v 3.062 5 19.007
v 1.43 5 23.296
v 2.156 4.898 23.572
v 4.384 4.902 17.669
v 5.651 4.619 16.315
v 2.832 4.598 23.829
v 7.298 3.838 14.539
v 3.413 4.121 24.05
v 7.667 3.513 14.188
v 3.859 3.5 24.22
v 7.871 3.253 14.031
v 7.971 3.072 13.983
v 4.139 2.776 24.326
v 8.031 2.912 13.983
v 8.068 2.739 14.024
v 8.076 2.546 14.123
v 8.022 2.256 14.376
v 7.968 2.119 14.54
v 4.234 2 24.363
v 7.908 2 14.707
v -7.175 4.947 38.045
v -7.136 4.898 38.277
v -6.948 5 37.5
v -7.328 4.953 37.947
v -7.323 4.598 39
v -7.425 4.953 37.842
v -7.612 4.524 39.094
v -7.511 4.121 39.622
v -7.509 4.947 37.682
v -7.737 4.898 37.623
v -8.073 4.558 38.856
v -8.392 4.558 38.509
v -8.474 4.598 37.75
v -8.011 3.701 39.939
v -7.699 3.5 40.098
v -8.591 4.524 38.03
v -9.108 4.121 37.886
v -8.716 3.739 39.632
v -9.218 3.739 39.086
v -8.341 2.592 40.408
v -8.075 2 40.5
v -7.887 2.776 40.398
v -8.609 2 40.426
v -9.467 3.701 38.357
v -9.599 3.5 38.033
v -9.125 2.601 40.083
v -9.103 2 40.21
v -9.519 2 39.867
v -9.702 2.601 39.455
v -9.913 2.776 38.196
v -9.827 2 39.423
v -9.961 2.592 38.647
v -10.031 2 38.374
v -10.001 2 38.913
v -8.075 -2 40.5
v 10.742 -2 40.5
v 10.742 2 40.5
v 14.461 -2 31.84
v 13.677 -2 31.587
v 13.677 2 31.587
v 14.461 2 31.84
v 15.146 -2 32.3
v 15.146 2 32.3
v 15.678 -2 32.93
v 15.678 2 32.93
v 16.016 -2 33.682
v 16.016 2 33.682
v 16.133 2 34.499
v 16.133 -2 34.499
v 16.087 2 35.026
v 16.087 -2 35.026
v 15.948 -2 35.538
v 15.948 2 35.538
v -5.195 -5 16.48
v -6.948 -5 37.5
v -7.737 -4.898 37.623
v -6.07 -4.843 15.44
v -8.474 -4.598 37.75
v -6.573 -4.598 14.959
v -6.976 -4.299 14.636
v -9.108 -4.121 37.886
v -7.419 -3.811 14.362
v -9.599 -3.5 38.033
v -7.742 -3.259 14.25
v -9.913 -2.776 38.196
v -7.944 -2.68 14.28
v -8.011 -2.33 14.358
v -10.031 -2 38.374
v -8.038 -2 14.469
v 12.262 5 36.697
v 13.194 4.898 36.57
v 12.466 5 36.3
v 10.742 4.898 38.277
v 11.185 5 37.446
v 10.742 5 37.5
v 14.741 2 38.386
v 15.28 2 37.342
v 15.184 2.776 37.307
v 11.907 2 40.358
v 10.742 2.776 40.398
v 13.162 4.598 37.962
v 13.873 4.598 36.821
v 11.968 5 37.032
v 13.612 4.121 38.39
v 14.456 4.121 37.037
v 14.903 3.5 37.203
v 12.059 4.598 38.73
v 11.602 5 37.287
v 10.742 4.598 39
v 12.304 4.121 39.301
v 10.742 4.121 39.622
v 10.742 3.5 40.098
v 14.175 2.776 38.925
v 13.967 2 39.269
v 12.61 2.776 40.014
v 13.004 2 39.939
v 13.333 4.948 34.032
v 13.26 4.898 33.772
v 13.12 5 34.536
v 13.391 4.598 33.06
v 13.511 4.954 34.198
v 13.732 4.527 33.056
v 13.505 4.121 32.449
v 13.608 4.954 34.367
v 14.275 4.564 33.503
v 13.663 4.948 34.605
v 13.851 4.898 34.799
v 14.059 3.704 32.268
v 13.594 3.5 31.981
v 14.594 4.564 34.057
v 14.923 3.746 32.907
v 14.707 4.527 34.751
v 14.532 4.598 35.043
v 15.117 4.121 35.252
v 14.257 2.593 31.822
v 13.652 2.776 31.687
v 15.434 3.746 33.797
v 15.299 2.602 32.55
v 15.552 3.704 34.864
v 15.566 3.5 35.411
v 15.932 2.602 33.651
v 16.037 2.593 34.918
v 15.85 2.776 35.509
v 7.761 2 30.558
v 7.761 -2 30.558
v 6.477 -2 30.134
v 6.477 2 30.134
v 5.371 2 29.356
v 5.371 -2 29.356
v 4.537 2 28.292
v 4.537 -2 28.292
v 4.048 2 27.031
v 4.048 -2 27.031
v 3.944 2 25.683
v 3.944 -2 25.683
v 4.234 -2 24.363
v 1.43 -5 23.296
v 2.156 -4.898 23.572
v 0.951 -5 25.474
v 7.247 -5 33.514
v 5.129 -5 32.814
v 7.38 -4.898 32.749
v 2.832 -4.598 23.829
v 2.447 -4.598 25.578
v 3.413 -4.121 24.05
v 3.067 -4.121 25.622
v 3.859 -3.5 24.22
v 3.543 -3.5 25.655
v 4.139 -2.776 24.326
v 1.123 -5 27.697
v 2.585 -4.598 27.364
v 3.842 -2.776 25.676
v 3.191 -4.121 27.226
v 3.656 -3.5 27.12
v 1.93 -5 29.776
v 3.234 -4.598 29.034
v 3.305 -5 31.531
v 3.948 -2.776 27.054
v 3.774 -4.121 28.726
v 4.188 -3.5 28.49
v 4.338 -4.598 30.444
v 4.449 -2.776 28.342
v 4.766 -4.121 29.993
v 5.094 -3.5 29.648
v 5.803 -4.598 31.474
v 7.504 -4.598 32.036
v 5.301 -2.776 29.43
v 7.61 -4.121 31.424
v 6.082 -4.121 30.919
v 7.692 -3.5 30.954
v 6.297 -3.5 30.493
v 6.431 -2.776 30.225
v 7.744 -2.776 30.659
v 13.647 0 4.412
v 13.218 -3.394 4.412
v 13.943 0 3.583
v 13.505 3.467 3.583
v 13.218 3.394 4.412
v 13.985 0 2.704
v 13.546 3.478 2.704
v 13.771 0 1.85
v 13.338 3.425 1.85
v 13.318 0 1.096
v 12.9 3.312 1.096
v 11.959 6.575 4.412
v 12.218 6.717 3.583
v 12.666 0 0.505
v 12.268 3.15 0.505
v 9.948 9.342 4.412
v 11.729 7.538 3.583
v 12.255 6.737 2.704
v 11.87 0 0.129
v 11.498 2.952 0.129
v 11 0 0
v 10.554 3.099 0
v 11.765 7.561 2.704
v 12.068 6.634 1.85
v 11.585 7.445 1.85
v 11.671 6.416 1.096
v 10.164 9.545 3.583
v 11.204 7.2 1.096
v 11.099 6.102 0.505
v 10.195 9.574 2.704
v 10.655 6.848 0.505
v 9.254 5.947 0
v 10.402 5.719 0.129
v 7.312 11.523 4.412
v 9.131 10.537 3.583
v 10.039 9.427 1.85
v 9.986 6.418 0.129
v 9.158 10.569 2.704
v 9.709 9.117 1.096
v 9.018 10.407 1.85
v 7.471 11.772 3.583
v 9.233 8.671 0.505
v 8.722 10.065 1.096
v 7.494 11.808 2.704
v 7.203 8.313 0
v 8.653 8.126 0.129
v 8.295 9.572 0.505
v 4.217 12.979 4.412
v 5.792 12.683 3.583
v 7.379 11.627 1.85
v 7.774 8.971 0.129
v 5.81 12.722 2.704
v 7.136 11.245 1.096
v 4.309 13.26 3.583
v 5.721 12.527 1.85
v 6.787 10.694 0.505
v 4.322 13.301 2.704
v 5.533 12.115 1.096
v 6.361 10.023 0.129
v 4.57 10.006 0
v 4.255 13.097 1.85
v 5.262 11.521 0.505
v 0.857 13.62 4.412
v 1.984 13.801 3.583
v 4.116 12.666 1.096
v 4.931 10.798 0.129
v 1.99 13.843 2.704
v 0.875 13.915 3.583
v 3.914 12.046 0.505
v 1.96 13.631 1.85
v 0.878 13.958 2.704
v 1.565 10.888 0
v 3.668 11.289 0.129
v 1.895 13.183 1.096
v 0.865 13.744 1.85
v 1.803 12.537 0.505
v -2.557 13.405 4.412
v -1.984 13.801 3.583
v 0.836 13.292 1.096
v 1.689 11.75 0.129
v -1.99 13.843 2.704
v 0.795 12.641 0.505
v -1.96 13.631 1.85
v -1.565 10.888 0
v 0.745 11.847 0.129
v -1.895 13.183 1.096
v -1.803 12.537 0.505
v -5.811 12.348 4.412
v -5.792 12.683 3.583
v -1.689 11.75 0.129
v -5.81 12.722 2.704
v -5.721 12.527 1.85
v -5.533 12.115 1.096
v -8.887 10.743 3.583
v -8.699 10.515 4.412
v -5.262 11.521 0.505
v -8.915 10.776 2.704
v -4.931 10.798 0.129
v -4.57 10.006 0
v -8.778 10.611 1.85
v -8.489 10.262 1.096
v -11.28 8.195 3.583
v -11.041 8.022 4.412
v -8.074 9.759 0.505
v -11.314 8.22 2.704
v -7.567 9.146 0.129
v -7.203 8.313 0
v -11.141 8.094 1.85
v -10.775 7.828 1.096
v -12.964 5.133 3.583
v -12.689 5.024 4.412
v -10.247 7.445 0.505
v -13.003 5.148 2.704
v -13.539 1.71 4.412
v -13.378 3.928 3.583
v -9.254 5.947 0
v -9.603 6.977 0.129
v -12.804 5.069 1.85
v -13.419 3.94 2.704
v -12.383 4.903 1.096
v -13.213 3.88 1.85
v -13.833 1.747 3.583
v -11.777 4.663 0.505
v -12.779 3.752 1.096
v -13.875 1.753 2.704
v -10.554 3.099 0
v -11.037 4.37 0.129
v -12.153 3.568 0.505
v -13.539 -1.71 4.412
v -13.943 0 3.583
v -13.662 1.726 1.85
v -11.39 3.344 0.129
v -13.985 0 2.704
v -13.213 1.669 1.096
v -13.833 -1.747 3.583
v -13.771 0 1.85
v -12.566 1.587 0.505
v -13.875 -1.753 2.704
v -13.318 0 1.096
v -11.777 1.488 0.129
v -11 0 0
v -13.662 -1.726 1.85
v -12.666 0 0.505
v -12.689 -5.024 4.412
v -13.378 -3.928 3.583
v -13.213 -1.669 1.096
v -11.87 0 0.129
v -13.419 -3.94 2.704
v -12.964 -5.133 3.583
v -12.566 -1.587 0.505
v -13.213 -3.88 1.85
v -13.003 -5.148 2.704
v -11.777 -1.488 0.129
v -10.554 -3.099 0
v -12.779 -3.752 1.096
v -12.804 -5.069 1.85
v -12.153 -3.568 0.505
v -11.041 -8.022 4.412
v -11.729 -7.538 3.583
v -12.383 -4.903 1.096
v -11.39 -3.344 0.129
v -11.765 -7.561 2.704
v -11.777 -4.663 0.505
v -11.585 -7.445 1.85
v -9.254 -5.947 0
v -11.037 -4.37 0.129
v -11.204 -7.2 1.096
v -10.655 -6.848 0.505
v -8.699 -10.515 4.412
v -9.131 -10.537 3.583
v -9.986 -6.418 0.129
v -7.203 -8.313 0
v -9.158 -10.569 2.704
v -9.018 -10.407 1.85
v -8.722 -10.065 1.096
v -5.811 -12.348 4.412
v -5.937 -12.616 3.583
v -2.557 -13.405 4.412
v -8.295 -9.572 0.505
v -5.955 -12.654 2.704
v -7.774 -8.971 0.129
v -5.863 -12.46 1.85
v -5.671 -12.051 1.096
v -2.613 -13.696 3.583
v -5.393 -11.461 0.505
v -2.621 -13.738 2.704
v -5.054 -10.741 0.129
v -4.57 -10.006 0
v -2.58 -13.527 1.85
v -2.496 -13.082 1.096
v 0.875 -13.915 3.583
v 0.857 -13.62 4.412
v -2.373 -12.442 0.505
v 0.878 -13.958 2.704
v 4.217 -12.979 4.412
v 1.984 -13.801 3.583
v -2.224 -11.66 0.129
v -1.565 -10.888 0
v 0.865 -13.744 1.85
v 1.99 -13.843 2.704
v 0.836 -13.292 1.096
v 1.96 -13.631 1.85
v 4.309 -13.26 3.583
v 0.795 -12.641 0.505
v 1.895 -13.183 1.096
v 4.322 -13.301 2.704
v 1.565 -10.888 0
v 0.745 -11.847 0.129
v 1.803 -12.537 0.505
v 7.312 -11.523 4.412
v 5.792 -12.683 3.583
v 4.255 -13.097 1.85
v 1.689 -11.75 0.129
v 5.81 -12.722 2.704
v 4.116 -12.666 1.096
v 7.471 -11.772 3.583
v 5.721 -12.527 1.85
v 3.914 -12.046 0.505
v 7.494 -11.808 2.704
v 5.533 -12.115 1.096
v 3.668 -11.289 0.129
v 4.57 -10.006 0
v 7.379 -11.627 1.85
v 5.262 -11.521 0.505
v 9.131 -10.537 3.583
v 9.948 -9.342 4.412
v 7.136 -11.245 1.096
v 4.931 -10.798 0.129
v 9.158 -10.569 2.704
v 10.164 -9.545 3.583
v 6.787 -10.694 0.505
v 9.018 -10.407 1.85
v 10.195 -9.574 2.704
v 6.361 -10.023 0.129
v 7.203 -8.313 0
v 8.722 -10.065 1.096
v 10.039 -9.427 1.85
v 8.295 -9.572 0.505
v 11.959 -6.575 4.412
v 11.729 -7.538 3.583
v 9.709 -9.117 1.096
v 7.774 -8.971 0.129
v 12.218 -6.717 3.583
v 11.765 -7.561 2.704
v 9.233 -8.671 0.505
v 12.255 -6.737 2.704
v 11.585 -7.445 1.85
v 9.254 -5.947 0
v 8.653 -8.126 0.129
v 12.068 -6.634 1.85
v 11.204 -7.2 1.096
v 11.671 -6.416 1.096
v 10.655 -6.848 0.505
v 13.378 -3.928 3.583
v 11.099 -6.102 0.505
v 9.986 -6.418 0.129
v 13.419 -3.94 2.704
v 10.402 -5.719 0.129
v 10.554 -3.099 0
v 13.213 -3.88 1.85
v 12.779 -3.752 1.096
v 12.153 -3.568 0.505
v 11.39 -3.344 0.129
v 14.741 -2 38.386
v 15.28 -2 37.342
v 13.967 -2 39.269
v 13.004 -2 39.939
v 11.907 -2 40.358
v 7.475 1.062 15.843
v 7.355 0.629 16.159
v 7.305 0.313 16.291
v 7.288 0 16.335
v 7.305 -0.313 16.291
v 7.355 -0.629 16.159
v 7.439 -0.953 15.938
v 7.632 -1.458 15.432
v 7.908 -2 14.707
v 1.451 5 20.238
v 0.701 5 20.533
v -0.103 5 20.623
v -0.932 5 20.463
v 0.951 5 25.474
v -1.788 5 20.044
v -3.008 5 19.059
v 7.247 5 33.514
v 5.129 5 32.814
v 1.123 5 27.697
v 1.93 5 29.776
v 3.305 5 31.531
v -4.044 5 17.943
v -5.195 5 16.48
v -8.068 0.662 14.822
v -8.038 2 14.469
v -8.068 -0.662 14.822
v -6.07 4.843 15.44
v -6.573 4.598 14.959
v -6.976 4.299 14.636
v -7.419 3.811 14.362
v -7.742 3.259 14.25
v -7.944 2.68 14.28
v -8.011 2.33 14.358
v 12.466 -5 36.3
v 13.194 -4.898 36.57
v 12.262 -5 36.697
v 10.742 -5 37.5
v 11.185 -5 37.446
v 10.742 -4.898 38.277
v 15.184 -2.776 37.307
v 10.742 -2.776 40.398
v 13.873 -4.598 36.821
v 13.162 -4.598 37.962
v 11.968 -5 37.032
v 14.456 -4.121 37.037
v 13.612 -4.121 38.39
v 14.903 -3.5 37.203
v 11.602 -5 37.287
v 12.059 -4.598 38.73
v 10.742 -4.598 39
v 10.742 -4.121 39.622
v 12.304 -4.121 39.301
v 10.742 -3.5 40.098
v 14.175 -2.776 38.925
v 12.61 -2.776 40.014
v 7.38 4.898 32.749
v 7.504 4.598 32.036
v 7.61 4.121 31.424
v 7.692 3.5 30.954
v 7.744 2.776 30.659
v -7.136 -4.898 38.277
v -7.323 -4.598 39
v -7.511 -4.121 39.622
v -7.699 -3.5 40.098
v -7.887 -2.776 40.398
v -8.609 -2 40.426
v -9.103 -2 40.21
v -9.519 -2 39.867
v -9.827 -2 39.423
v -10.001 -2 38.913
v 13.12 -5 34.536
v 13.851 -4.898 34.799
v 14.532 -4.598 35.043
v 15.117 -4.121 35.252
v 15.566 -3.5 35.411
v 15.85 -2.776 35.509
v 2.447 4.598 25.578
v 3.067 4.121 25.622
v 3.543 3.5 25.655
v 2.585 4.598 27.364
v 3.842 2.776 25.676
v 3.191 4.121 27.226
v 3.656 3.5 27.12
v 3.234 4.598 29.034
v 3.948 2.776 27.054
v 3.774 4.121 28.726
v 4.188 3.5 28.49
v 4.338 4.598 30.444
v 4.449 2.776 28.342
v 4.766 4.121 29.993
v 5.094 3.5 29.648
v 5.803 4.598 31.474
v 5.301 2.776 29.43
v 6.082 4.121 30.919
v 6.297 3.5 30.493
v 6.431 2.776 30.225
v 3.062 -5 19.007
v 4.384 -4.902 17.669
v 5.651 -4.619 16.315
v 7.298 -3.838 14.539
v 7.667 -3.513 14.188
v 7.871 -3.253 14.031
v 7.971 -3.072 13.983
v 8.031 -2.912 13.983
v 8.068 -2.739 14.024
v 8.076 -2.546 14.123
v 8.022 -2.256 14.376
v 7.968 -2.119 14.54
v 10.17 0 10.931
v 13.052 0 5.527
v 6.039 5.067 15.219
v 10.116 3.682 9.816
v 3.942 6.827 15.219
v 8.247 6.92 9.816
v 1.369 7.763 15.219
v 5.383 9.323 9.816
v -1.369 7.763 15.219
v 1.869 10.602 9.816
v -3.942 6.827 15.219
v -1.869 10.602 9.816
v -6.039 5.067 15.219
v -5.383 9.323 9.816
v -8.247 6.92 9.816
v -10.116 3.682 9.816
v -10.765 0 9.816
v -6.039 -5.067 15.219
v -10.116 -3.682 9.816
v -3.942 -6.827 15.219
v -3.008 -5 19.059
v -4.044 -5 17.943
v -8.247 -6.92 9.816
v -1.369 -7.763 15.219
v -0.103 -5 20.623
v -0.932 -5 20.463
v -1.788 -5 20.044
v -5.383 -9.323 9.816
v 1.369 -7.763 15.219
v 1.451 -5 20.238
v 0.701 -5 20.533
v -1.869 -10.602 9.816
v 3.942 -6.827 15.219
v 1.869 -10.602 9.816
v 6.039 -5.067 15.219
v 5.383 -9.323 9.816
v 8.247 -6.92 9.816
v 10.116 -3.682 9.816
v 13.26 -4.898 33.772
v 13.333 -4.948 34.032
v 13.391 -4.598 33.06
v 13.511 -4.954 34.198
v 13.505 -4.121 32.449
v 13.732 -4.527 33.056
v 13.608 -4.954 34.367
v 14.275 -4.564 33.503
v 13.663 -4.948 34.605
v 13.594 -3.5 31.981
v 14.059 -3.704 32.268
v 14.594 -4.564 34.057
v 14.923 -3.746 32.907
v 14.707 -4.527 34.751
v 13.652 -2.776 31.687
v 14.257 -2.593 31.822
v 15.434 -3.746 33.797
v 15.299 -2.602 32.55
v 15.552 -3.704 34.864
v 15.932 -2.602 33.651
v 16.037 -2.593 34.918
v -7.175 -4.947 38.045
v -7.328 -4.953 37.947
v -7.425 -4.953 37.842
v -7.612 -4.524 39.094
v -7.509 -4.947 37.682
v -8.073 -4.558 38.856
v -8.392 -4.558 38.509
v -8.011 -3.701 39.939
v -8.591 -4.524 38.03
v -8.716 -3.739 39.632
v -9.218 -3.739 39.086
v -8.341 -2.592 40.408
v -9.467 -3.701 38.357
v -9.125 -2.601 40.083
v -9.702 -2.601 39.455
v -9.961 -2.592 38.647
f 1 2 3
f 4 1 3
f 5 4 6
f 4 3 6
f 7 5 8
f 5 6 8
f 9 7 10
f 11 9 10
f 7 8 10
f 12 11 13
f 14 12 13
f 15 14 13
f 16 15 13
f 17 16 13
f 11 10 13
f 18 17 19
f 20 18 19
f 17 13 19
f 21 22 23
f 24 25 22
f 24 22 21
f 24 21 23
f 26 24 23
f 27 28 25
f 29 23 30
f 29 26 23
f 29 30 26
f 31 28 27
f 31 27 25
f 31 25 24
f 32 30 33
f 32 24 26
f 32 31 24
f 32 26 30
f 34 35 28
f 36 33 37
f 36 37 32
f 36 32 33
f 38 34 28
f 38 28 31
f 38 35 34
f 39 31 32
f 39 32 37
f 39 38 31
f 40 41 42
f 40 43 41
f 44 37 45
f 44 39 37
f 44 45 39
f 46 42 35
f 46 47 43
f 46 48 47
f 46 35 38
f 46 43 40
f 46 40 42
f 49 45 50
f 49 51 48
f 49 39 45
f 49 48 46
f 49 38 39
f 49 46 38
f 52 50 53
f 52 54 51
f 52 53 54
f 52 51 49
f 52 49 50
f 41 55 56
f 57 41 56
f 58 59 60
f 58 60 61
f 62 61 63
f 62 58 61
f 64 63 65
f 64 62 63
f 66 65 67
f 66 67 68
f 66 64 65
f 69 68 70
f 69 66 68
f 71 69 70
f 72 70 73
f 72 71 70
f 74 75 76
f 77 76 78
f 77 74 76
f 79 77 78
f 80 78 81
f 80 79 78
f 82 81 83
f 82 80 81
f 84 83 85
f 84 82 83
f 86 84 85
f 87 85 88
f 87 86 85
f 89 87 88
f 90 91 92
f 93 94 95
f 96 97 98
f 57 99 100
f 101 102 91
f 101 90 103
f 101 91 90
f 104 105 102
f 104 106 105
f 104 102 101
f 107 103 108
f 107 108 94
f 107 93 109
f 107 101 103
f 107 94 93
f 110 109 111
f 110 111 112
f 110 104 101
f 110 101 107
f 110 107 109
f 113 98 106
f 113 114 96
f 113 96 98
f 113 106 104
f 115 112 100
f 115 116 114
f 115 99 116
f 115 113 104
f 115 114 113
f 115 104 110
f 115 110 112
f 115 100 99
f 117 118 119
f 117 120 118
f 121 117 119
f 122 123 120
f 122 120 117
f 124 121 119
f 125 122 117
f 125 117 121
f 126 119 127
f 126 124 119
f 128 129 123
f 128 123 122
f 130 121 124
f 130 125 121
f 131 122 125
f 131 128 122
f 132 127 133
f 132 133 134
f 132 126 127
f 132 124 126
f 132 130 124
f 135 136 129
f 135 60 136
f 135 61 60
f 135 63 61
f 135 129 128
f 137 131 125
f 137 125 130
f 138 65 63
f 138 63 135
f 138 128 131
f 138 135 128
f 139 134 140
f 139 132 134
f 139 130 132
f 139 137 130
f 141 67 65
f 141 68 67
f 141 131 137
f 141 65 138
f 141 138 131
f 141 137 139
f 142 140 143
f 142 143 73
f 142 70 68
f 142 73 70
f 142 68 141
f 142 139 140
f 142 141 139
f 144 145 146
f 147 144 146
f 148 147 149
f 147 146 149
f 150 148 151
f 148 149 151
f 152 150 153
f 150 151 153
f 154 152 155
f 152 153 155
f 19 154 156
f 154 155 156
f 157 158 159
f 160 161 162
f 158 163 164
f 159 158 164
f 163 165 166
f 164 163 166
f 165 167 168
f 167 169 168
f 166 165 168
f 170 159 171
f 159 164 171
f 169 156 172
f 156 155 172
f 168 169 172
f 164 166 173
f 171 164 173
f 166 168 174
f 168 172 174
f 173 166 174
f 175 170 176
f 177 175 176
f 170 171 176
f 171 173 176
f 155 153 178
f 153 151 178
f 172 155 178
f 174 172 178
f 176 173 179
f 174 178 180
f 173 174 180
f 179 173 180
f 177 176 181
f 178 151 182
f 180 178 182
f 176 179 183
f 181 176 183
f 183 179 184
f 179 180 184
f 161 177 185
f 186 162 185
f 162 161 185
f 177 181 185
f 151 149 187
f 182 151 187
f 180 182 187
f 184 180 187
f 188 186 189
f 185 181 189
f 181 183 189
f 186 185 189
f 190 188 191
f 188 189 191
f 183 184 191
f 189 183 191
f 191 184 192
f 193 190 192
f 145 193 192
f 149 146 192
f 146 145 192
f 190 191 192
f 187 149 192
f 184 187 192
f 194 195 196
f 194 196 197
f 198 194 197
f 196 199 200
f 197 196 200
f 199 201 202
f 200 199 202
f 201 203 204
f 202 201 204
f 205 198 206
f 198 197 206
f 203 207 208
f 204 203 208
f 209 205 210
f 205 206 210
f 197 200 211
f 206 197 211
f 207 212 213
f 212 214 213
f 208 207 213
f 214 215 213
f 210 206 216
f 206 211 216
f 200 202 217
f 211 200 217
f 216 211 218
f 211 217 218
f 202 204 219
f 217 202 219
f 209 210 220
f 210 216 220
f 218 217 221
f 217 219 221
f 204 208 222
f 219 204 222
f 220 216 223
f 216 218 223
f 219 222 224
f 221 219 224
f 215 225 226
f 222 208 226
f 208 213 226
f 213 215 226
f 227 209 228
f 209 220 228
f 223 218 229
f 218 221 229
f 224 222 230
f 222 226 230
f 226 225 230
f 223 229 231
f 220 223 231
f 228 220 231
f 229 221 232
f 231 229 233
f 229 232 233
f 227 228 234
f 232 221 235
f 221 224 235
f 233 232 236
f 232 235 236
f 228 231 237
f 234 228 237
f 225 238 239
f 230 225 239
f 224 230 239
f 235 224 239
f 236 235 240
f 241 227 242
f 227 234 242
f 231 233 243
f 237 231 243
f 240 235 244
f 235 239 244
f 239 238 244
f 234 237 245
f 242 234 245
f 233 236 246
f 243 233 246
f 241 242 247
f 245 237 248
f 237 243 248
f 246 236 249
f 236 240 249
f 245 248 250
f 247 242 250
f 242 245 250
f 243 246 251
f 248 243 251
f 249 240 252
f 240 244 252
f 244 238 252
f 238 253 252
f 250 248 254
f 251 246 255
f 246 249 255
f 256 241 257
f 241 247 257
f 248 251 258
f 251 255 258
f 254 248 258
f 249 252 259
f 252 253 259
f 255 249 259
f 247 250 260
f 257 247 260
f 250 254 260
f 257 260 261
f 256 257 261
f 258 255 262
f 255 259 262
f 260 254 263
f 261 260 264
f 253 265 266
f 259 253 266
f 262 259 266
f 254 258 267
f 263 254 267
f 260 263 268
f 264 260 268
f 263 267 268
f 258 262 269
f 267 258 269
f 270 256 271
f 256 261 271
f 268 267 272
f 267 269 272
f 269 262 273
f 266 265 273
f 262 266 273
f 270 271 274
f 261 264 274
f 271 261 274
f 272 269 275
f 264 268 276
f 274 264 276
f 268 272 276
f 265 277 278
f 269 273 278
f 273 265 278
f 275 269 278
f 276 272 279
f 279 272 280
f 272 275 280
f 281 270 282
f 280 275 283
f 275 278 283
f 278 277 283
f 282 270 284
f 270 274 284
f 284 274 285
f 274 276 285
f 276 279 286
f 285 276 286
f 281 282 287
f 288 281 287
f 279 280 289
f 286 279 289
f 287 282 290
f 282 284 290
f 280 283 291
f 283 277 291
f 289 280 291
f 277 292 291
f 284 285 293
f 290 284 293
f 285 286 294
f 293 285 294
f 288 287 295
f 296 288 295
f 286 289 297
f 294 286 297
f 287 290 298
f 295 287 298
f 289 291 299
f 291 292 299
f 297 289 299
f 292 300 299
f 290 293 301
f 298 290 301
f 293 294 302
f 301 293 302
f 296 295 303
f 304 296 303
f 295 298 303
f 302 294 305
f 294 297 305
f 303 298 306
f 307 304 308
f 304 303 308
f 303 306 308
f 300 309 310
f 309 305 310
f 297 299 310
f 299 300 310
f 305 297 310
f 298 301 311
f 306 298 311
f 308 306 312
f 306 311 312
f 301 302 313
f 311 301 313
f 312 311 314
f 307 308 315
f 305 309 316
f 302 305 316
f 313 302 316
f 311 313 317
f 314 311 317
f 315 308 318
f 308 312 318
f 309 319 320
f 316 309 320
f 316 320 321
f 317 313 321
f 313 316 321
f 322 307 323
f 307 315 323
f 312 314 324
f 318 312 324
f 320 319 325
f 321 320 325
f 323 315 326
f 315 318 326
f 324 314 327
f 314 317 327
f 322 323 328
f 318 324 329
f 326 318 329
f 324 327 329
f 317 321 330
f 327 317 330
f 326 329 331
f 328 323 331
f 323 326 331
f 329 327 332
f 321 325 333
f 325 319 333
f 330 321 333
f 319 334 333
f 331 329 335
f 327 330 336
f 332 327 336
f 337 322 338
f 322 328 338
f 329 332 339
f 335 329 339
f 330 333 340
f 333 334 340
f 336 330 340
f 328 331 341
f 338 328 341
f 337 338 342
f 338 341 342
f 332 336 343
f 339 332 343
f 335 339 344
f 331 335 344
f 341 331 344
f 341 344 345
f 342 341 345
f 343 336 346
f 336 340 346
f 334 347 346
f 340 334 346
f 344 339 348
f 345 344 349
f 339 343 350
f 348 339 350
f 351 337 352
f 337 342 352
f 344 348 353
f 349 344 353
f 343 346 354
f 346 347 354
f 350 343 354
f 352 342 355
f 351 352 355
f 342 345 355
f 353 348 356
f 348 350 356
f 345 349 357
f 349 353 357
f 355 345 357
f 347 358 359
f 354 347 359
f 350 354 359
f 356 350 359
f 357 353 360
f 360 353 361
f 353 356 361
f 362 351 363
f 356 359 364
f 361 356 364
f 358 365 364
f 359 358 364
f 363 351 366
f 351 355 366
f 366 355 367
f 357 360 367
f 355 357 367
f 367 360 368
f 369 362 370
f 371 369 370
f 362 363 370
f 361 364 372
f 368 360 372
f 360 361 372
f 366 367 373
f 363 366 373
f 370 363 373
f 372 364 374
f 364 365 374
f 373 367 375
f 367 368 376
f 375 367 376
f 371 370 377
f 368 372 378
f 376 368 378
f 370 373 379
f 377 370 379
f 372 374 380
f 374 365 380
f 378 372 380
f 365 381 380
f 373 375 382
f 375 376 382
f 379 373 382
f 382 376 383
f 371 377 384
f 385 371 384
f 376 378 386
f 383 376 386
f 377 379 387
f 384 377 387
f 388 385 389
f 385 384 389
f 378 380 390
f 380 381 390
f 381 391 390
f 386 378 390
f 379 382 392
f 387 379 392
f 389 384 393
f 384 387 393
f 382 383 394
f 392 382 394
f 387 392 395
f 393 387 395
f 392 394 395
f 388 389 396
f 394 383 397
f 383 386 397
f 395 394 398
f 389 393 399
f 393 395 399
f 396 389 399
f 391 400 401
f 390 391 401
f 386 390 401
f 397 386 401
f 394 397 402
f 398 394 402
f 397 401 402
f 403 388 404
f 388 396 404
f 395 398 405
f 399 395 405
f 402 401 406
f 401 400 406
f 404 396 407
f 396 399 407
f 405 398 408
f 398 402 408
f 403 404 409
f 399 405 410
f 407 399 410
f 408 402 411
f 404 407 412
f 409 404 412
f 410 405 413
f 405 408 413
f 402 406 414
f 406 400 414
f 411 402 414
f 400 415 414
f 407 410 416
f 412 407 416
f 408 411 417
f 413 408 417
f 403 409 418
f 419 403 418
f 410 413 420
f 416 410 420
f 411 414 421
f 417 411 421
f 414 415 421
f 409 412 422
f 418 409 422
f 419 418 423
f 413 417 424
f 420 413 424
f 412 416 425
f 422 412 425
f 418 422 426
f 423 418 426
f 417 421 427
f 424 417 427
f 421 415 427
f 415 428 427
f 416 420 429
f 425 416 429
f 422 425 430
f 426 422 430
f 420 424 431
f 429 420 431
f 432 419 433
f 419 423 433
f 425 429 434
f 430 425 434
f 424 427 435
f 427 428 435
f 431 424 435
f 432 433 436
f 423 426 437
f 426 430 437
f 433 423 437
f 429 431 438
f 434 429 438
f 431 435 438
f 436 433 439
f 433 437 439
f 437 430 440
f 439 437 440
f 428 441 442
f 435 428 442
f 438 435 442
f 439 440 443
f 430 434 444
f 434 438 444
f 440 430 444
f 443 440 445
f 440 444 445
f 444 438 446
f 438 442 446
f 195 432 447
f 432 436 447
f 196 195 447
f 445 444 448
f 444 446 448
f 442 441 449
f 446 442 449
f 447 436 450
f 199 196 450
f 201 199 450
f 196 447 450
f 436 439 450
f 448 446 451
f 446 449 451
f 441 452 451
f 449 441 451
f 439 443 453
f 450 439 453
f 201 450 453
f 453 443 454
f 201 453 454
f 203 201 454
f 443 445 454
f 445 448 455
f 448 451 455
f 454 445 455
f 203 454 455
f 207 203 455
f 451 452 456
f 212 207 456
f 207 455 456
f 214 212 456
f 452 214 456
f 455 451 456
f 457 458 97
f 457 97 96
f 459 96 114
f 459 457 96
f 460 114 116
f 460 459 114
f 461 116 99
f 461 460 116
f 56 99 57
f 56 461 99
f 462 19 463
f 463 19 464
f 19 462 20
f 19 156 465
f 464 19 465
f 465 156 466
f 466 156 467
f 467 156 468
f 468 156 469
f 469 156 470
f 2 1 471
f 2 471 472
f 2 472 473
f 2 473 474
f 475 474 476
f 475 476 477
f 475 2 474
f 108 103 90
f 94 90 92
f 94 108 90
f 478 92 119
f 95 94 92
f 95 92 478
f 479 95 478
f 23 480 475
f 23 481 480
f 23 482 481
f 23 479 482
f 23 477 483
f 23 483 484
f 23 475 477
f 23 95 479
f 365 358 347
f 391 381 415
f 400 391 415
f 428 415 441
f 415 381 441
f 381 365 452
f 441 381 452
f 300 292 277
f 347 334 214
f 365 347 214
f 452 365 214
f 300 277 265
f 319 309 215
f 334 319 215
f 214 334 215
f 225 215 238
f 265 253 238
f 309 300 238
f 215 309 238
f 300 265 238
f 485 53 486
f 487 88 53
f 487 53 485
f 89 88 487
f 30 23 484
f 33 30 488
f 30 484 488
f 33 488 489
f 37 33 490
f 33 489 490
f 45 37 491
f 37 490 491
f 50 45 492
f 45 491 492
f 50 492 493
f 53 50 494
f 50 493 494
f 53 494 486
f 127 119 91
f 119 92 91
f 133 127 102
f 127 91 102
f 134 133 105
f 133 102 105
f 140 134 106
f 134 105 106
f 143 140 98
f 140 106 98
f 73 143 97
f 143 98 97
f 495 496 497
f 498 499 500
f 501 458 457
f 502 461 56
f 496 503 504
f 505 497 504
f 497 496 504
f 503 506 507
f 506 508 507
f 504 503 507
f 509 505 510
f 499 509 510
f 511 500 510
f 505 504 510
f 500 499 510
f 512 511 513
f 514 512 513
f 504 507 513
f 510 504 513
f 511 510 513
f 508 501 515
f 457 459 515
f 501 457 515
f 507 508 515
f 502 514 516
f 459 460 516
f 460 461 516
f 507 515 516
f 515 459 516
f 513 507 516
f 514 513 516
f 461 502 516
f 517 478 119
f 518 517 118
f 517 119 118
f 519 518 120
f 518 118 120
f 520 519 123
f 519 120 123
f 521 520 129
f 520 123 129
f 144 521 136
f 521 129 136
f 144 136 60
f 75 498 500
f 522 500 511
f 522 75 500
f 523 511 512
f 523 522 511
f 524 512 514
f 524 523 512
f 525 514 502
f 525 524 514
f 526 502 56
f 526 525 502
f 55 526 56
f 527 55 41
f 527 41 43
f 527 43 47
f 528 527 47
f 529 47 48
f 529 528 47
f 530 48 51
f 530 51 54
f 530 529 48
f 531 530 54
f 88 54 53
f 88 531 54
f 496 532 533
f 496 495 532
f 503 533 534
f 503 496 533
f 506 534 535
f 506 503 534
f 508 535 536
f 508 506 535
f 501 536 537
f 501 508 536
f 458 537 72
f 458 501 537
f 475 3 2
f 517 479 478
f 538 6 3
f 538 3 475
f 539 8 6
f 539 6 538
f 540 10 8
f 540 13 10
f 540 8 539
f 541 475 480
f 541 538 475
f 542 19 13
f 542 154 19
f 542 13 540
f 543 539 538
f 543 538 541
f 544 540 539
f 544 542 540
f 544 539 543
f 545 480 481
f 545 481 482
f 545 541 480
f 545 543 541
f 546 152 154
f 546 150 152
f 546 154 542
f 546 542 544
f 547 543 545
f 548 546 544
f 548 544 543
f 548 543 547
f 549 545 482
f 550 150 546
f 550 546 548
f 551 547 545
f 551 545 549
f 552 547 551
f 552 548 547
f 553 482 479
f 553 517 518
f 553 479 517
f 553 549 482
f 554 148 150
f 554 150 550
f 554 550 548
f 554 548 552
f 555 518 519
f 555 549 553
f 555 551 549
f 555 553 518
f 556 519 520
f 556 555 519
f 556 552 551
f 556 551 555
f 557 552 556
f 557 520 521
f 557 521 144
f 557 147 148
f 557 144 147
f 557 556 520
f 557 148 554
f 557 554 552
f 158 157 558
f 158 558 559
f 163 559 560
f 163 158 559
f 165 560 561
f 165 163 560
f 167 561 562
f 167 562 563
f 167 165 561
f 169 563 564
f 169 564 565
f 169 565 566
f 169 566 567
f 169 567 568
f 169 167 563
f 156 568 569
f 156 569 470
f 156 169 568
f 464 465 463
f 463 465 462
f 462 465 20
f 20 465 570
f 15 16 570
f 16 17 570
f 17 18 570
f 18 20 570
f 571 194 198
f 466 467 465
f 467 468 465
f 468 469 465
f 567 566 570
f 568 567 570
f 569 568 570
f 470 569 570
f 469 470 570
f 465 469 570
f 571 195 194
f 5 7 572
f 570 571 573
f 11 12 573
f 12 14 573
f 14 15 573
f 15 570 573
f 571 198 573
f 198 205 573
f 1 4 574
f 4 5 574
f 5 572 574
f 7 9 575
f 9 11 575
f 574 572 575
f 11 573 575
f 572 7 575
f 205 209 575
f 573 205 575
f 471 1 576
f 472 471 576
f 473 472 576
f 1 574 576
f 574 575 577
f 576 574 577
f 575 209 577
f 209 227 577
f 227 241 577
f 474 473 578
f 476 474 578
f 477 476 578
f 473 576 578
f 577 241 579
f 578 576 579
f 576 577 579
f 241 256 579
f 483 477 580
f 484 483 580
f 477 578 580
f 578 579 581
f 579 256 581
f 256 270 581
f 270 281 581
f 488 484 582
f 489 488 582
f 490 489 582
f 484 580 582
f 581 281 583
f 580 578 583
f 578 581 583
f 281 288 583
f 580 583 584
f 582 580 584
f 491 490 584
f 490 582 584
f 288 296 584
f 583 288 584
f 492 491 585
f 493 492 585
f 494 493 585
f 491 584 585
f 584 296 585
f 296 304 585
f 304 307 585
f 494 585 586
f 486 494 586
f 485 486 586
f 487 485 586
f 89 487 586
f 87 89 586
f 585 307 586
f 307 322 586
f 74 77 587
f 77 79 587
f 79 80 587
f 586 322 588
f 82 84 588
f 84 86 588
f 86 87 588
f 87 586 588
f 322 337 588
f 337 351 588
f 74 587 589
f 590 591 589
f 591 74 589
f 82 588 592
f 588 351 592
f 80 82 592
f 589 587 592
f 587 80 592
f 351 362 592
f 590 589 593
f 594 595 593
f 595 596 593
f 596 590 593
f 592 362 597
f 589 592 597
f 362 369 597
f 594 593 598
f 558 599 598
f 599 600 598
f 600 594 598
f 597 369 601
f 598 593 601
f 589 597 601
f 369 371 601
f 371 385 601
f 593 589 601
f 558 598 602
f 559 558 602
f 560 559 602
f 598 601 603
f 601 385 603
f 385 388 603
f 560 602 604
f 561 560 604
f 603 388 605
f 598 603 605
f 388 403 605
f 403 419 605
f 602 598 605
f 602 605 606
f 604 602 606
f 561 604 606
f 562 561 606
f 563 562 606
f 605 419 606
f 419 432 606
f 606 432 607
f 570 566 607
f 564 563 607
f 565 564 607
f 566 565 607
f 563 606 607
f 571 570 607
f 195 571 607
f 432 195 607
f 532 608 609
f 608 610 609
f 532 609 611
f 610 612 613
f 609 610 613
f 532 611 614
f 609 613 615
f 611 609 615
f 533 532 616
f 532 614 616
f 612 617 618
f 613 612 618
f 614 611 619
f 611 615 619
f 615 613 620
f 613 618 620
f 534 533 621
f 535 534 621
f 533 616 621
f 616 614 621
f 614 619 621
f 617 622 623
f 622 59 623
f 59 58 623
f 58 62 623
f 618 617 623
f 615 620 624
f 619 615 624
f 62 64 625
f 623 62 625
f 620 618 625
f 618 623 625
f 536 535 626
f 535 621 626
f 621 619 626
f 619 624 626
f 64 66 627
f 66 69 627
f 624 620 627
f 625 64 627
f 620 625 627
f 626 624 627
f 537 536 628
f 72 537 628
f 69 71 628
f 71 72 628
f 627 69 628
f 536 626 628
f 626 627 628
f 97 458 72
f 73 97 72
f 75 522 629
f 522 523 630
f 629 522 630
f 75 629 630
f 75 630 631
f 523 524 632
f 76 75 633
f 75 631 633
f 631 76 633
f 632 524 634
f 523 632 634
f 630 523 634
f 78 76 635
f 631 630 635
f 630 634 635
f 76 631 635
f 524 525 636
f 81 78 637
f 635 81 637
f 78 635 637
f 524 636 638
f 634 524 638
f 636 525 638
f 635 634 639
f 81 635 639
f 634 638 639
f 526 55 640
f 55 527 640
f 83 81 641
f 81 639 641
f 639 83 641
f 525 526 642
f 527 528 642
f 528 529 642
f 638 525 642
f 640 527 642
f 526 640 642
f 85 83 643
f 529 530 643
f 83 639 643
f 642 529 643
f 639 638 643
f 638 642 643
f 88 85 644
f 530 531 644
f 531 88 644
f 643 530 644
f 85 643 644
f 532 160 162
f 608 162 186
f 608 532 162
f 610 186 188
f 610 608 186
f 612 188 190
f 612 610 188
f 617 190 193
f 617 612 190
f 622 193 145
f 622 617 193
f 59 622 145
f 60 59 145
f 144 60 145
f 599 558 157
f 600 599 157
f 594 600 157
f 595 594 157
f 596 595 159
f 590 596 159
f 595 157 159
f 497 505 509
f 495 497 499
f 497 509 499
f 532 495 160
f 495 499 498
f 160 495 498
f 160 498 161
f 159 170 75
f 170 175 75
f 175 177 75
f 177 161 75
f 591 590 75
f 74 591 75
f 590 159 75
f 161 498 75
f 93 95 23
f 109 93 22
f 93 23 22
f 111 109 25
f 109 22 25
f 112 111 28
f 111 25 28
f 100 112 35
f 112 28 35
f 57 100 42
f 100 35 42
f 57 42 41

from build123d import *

# Parameters (mm, degrees)
PAD_DEPTH   = 5
FILLET_R    = 3
FILLET001_R = 3


with BuildPart() as fillet_body:
    # Sketch → Pad (new body, symmetric)
    with BuildSketch(Plane.XZ):
        with BuildLine():
            Line((-8.074896, 40.500361), (10.74188, 40.500361))
            ThreePointArc((15.279556, 37.342338), (13.506098, 39.633148), (10.74188, 40.500361))
            Line((15.279556, 37.342338), (15.948128, 35.53762))
            ThreePointArc((13.676512, 31.587292), (15.738151, 33.030062), (15.948128, 35.53762))
            Line((13.676512, 31.587292), (7.761121, 30.557998))
            ThreePointArc((7.761121, 30.557998), (4.537487, 28.291566), (4.234332, 24.362619))
            Line((4.234332, 24.362619), (13.501884, 0))
            Line((13.501884, 0), (-6.832076, 0))
            Line((-10.03093, 38.37449), (-6.832076, 0))
            ThreePointArc((-8.074896, 40.500361), (-9.519316, 39.866568), (-10.03093, 38.37449))
        make_face()
    extrude(amount=PAD_DEPTH, both=True)

    # Fillet
    fillet_edges = [fillet_body.edges().sort_by_distance(p)[0] for p in [
        (-9.519316, -5, 39.866568),
        (1.333492, -5, 40.500361),
        (13.506098, -5, 39.633148),
        (15.613842, -5, 36.439979),
        (15.738151, -5, 33.030062),
        (10.718817, -5, 31.072645),
        (4.537487, -5, 28.291566),
        (8.868108, -5, 12.181309),
        (3.334904, -5, 0),
        (-8.431503, -5, 19.187245),
        (-9.519316, 5, 39.866568),
        (1.333492, 5, 40.500361),
        (13.506098, 5, 39.633148),
        (15.613842, 5, 36.439979),
        (15.738151, 5, 33.030062),
        (10.718817, 5, 31.072645),
        (4.537487, 5, 28.291566),
        (8.868108, 5, 12.181309),
        (3.334904, 5, 0),
        (-8.431503, 5, 19.187245),
    ]]
    fillet(fillet_edges, radius=FILLET_R)


with BuildPart() as fillet001:
    # Sketch001 → Revolution (revolve)
    with BuildSketch(Plane.XZ):
        Polygon((0, 30), (16, 0), (0, 0), align=None)
    revolve(axis=Axis((0, 0, 0), (0, 0, 1)))

    # Fusion: union Fillet body
    add(fillet_body.part)

    # Fillet001
    fillet001_edges = [fillet001.edges().sort_by_distance(p)[0] for p in [
        (-16, 0, 0),
    ]]
    fillet(fillet001_edges, radius=FILLET001_R)


solid = fillet001.part
